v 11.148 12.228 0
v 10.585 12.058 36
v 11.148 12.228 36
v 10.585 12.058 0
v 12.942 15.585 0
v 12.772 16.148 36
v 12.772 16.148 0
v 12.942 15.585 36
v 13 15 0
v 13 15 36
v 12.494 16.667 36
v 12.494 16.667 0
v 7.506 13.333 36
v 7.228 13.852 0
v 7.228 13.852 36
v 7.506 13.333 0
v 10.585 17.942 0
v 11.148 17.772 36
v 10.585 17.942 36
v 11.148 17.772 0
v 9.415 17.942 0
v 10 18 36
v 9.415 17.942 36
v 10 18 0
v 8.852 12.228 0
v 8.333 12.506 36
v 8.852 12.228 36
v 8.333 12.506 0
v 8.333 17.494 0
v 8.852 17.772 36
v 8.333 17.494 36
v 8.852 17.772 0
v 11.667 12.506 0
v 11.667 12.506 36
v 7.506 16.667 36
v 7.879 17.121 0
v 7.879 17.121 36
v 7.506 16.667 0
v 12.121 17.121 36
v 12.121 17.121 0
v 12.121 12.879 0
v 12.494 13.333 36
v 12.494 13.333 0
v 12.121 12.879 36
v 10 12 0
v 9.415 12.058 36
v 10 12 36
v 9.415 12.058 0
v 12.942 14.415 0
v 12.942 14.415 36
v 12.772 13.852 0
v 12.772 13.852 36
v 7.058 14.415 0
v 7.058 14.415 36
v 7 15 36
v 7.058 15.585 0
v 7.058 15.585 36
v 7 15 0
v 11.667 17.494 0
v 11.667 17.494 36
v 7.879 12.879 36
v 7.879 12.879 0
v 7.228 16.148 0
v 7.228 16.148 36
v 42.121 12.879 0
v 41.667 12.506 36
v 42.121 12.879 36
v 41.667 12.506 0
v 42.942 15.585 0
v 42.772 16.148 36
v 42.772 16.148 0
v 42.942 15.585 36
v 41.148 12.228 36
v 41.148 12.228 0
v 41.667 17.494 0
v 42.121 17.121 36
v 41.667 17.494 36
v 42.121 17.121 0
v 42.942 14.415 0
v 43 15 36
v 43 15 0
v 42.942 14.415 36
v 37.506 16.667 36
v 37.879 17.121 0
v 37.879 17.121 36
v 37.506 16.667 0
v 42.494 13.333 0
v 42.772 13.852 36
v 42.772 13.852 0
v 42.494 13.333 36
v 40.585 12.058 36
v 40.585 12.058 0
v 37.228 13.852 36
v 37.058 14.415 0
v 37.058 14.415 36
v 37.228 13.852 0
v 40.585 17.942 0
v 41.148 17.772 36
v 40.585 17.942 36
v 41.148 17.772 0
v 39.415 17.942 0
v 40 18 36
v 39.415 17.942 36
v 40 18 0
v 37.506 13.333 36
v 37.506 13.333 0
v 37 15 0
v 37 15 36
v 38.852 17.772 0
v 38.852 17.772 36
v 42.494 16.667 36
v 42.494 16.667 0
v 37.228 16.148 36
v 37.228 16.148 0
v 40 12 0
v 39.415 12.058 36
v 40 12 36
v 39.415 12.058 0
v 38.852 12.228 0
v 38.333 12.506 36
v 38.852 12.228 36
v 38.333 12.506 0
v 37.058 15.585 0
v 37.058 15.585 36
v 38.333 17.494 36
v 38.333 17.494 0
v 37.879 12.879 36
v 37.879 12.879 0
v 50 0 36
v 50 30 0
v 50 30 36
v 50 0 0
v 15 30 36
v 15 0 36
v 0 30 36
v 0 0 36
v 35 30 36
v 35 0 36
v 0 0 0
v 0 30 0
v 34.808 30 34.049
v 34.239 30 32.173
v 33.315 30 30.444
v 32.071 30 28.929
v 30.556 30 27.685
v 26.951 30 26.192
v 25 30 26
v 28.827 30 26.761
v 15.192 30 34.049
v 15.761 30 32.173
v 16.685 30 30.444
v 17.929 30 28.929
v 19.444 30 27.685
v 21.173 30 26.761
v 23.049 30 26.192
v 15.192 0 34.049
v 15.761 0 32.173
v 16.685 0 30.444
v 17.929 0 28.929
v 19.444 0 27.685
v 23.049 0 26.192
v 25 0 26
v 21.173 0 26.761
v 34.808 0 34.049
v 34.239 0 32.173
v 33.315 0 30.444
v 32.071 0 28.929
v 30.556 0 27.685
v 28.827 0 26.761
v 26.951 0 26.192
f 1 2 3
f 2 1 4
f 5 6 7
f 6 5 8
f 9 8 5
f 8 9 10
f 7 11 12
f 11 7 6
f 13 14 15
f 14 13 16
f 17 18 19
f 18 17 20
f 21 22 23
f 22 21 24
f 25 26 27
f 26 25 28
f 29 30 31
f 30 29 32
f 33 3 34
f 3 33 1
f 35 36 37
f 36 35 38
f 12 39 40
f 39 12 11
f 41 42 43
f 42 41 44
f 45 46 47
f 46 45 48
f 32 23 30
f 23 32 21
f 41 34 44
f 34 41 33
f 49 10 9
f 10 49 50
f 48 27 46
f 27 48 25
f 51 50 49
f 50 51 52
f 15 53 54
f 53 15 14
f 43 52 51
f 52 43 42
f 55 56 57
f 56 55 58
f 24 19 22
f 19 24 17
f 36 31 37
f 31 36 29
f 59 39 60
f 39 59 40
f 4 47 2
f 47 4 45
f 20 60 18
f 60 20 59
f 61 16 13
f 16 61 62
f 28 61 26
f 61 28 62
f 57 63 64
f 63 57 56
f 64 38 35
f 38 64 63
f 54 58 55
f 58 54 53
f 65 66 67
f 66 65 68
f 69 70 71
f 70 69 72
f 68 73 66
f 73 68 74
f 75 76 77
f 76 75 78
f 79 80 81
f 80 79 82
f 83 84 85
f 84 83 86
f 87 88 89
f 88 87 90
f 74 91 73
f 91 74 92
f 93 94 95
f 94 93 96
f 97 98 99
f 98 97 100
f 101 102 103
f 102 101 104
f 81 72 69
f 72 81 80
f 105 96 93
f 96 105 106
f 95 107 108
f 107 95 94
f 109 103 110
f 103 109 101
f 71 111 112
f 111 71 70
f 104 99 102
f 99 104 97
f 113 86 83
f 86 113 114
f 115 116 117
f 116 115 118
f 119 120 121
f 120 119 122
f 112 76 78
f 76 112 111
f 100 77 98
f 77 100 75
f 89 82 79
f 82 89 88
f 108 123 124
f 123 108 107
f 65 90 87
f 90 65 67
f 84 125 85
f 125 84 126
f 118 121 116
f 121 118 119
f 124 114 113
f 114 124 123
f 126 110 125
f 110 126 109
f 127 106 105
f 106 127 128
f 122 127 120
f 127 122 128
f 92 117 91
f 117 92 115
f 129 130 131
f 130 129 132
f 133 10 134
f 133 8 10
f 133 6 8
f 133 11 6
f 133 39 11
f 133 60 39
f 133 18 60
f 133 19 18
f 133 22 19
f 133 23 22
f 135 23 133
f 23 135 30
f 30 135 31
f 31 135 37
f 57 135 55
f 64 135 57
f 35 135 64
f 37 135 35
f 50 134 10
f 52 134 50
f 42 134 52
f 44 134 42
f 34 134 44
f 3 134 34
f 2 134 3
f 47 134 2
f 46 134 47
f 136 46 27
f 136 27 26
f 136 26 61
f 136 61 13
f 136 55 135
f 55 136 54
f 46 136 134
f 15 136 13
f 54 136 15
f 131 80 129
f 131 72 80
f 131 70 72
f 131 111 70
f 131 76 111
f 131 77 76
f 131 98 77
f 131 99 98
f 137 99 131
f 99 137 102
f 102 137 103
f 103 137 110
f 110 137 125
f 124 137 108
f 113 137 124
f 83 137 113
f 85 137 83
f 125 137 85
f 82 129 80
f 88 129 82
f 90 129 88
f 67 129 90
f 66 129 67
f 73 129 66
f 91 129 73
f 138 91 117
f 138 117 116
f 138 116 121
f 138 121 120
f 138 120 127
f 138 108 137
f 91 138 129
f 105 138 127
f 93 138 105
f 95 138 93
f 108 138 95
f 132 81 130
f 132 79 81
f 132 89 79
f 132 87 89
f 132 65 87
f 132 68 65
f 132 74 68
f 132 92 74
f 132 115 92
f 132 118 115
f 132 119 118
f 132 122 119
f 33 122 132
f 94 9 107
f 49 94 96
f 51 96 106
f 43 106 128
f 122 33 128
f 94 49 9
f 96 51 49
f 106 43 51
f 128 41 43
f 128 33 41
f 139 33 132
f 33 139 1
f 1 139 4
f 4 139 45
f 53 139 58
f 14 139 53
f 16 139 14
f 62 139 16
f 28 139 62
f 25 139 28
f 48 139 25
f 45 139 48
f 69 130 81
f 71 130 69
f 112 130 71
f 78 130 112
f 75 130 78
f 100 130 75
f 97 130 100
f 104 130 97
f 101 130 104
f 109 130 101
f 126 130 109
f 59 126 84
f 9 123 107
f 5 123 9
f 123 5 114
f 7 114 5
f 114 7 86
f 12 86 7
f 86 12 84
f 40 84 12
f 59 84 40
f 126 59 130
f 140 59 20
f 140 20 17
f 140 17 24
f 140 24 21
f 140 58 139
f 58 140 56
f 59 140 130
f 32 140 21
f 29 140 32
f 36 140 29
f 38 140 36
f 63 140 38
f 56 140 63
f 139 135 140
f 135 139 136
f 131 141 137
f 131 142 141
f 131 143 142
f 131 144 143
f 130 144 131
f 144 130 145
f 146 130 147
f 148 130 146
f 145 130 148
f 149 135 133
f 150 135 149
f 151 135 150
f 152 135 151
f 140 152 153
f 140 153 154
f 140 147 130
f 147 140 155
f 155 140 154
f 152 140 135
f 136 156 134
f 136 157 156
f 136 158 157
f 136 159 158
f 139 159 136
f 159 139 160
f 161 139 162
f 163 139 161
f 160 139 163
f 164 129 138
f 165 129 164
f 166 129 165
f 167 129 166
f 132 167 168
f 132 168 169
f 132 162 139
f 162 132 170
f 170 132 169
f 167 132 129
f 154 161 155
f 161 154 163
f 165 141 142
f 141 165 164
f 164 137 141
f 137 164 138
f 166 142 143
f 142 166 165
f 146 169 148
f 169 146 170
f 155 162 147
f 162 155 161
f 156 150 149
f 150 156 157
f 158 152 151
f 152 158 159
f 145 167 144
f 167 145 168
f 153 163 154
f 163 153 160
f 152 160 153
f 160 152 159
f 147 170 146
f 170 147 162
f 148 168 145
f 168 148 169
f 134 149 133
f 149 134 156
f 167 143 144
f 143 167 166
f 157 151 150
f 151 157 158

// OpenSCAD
$fn = 32;

// ----------------------------------------------------------------------
// Saddle clamp: plain shaft clamp
// ----------------------------------------------------------------------

// --- parameters (mm) ---
blk_l = 50;               // block length, X
blk_w = 30;               // block width, Y
blk_h = 36;               // block height
clamp_r = 10;             // shaft groove radius
hole_r = 3;               // bolt hole radius
hole_m = 10;              // bolt hole margin from the ends

saw_depth = clamp_r + 3;  // saw kerf depth

difference() {
  cube([blk_l, blk_w, blk_h]);
  translate([blk_l / 2, -1, blk_h])
    rotate([-90, 0, 0])
      cylinder(h = blk_w + 2, r = clamp_r);
  for (sx = [0, 1])
    translate([sx ? blk_l - hole_m : hole_m, blk_w / 2, -1])
      cylinder(r = hole_r, h = blk_h + 2);
}
